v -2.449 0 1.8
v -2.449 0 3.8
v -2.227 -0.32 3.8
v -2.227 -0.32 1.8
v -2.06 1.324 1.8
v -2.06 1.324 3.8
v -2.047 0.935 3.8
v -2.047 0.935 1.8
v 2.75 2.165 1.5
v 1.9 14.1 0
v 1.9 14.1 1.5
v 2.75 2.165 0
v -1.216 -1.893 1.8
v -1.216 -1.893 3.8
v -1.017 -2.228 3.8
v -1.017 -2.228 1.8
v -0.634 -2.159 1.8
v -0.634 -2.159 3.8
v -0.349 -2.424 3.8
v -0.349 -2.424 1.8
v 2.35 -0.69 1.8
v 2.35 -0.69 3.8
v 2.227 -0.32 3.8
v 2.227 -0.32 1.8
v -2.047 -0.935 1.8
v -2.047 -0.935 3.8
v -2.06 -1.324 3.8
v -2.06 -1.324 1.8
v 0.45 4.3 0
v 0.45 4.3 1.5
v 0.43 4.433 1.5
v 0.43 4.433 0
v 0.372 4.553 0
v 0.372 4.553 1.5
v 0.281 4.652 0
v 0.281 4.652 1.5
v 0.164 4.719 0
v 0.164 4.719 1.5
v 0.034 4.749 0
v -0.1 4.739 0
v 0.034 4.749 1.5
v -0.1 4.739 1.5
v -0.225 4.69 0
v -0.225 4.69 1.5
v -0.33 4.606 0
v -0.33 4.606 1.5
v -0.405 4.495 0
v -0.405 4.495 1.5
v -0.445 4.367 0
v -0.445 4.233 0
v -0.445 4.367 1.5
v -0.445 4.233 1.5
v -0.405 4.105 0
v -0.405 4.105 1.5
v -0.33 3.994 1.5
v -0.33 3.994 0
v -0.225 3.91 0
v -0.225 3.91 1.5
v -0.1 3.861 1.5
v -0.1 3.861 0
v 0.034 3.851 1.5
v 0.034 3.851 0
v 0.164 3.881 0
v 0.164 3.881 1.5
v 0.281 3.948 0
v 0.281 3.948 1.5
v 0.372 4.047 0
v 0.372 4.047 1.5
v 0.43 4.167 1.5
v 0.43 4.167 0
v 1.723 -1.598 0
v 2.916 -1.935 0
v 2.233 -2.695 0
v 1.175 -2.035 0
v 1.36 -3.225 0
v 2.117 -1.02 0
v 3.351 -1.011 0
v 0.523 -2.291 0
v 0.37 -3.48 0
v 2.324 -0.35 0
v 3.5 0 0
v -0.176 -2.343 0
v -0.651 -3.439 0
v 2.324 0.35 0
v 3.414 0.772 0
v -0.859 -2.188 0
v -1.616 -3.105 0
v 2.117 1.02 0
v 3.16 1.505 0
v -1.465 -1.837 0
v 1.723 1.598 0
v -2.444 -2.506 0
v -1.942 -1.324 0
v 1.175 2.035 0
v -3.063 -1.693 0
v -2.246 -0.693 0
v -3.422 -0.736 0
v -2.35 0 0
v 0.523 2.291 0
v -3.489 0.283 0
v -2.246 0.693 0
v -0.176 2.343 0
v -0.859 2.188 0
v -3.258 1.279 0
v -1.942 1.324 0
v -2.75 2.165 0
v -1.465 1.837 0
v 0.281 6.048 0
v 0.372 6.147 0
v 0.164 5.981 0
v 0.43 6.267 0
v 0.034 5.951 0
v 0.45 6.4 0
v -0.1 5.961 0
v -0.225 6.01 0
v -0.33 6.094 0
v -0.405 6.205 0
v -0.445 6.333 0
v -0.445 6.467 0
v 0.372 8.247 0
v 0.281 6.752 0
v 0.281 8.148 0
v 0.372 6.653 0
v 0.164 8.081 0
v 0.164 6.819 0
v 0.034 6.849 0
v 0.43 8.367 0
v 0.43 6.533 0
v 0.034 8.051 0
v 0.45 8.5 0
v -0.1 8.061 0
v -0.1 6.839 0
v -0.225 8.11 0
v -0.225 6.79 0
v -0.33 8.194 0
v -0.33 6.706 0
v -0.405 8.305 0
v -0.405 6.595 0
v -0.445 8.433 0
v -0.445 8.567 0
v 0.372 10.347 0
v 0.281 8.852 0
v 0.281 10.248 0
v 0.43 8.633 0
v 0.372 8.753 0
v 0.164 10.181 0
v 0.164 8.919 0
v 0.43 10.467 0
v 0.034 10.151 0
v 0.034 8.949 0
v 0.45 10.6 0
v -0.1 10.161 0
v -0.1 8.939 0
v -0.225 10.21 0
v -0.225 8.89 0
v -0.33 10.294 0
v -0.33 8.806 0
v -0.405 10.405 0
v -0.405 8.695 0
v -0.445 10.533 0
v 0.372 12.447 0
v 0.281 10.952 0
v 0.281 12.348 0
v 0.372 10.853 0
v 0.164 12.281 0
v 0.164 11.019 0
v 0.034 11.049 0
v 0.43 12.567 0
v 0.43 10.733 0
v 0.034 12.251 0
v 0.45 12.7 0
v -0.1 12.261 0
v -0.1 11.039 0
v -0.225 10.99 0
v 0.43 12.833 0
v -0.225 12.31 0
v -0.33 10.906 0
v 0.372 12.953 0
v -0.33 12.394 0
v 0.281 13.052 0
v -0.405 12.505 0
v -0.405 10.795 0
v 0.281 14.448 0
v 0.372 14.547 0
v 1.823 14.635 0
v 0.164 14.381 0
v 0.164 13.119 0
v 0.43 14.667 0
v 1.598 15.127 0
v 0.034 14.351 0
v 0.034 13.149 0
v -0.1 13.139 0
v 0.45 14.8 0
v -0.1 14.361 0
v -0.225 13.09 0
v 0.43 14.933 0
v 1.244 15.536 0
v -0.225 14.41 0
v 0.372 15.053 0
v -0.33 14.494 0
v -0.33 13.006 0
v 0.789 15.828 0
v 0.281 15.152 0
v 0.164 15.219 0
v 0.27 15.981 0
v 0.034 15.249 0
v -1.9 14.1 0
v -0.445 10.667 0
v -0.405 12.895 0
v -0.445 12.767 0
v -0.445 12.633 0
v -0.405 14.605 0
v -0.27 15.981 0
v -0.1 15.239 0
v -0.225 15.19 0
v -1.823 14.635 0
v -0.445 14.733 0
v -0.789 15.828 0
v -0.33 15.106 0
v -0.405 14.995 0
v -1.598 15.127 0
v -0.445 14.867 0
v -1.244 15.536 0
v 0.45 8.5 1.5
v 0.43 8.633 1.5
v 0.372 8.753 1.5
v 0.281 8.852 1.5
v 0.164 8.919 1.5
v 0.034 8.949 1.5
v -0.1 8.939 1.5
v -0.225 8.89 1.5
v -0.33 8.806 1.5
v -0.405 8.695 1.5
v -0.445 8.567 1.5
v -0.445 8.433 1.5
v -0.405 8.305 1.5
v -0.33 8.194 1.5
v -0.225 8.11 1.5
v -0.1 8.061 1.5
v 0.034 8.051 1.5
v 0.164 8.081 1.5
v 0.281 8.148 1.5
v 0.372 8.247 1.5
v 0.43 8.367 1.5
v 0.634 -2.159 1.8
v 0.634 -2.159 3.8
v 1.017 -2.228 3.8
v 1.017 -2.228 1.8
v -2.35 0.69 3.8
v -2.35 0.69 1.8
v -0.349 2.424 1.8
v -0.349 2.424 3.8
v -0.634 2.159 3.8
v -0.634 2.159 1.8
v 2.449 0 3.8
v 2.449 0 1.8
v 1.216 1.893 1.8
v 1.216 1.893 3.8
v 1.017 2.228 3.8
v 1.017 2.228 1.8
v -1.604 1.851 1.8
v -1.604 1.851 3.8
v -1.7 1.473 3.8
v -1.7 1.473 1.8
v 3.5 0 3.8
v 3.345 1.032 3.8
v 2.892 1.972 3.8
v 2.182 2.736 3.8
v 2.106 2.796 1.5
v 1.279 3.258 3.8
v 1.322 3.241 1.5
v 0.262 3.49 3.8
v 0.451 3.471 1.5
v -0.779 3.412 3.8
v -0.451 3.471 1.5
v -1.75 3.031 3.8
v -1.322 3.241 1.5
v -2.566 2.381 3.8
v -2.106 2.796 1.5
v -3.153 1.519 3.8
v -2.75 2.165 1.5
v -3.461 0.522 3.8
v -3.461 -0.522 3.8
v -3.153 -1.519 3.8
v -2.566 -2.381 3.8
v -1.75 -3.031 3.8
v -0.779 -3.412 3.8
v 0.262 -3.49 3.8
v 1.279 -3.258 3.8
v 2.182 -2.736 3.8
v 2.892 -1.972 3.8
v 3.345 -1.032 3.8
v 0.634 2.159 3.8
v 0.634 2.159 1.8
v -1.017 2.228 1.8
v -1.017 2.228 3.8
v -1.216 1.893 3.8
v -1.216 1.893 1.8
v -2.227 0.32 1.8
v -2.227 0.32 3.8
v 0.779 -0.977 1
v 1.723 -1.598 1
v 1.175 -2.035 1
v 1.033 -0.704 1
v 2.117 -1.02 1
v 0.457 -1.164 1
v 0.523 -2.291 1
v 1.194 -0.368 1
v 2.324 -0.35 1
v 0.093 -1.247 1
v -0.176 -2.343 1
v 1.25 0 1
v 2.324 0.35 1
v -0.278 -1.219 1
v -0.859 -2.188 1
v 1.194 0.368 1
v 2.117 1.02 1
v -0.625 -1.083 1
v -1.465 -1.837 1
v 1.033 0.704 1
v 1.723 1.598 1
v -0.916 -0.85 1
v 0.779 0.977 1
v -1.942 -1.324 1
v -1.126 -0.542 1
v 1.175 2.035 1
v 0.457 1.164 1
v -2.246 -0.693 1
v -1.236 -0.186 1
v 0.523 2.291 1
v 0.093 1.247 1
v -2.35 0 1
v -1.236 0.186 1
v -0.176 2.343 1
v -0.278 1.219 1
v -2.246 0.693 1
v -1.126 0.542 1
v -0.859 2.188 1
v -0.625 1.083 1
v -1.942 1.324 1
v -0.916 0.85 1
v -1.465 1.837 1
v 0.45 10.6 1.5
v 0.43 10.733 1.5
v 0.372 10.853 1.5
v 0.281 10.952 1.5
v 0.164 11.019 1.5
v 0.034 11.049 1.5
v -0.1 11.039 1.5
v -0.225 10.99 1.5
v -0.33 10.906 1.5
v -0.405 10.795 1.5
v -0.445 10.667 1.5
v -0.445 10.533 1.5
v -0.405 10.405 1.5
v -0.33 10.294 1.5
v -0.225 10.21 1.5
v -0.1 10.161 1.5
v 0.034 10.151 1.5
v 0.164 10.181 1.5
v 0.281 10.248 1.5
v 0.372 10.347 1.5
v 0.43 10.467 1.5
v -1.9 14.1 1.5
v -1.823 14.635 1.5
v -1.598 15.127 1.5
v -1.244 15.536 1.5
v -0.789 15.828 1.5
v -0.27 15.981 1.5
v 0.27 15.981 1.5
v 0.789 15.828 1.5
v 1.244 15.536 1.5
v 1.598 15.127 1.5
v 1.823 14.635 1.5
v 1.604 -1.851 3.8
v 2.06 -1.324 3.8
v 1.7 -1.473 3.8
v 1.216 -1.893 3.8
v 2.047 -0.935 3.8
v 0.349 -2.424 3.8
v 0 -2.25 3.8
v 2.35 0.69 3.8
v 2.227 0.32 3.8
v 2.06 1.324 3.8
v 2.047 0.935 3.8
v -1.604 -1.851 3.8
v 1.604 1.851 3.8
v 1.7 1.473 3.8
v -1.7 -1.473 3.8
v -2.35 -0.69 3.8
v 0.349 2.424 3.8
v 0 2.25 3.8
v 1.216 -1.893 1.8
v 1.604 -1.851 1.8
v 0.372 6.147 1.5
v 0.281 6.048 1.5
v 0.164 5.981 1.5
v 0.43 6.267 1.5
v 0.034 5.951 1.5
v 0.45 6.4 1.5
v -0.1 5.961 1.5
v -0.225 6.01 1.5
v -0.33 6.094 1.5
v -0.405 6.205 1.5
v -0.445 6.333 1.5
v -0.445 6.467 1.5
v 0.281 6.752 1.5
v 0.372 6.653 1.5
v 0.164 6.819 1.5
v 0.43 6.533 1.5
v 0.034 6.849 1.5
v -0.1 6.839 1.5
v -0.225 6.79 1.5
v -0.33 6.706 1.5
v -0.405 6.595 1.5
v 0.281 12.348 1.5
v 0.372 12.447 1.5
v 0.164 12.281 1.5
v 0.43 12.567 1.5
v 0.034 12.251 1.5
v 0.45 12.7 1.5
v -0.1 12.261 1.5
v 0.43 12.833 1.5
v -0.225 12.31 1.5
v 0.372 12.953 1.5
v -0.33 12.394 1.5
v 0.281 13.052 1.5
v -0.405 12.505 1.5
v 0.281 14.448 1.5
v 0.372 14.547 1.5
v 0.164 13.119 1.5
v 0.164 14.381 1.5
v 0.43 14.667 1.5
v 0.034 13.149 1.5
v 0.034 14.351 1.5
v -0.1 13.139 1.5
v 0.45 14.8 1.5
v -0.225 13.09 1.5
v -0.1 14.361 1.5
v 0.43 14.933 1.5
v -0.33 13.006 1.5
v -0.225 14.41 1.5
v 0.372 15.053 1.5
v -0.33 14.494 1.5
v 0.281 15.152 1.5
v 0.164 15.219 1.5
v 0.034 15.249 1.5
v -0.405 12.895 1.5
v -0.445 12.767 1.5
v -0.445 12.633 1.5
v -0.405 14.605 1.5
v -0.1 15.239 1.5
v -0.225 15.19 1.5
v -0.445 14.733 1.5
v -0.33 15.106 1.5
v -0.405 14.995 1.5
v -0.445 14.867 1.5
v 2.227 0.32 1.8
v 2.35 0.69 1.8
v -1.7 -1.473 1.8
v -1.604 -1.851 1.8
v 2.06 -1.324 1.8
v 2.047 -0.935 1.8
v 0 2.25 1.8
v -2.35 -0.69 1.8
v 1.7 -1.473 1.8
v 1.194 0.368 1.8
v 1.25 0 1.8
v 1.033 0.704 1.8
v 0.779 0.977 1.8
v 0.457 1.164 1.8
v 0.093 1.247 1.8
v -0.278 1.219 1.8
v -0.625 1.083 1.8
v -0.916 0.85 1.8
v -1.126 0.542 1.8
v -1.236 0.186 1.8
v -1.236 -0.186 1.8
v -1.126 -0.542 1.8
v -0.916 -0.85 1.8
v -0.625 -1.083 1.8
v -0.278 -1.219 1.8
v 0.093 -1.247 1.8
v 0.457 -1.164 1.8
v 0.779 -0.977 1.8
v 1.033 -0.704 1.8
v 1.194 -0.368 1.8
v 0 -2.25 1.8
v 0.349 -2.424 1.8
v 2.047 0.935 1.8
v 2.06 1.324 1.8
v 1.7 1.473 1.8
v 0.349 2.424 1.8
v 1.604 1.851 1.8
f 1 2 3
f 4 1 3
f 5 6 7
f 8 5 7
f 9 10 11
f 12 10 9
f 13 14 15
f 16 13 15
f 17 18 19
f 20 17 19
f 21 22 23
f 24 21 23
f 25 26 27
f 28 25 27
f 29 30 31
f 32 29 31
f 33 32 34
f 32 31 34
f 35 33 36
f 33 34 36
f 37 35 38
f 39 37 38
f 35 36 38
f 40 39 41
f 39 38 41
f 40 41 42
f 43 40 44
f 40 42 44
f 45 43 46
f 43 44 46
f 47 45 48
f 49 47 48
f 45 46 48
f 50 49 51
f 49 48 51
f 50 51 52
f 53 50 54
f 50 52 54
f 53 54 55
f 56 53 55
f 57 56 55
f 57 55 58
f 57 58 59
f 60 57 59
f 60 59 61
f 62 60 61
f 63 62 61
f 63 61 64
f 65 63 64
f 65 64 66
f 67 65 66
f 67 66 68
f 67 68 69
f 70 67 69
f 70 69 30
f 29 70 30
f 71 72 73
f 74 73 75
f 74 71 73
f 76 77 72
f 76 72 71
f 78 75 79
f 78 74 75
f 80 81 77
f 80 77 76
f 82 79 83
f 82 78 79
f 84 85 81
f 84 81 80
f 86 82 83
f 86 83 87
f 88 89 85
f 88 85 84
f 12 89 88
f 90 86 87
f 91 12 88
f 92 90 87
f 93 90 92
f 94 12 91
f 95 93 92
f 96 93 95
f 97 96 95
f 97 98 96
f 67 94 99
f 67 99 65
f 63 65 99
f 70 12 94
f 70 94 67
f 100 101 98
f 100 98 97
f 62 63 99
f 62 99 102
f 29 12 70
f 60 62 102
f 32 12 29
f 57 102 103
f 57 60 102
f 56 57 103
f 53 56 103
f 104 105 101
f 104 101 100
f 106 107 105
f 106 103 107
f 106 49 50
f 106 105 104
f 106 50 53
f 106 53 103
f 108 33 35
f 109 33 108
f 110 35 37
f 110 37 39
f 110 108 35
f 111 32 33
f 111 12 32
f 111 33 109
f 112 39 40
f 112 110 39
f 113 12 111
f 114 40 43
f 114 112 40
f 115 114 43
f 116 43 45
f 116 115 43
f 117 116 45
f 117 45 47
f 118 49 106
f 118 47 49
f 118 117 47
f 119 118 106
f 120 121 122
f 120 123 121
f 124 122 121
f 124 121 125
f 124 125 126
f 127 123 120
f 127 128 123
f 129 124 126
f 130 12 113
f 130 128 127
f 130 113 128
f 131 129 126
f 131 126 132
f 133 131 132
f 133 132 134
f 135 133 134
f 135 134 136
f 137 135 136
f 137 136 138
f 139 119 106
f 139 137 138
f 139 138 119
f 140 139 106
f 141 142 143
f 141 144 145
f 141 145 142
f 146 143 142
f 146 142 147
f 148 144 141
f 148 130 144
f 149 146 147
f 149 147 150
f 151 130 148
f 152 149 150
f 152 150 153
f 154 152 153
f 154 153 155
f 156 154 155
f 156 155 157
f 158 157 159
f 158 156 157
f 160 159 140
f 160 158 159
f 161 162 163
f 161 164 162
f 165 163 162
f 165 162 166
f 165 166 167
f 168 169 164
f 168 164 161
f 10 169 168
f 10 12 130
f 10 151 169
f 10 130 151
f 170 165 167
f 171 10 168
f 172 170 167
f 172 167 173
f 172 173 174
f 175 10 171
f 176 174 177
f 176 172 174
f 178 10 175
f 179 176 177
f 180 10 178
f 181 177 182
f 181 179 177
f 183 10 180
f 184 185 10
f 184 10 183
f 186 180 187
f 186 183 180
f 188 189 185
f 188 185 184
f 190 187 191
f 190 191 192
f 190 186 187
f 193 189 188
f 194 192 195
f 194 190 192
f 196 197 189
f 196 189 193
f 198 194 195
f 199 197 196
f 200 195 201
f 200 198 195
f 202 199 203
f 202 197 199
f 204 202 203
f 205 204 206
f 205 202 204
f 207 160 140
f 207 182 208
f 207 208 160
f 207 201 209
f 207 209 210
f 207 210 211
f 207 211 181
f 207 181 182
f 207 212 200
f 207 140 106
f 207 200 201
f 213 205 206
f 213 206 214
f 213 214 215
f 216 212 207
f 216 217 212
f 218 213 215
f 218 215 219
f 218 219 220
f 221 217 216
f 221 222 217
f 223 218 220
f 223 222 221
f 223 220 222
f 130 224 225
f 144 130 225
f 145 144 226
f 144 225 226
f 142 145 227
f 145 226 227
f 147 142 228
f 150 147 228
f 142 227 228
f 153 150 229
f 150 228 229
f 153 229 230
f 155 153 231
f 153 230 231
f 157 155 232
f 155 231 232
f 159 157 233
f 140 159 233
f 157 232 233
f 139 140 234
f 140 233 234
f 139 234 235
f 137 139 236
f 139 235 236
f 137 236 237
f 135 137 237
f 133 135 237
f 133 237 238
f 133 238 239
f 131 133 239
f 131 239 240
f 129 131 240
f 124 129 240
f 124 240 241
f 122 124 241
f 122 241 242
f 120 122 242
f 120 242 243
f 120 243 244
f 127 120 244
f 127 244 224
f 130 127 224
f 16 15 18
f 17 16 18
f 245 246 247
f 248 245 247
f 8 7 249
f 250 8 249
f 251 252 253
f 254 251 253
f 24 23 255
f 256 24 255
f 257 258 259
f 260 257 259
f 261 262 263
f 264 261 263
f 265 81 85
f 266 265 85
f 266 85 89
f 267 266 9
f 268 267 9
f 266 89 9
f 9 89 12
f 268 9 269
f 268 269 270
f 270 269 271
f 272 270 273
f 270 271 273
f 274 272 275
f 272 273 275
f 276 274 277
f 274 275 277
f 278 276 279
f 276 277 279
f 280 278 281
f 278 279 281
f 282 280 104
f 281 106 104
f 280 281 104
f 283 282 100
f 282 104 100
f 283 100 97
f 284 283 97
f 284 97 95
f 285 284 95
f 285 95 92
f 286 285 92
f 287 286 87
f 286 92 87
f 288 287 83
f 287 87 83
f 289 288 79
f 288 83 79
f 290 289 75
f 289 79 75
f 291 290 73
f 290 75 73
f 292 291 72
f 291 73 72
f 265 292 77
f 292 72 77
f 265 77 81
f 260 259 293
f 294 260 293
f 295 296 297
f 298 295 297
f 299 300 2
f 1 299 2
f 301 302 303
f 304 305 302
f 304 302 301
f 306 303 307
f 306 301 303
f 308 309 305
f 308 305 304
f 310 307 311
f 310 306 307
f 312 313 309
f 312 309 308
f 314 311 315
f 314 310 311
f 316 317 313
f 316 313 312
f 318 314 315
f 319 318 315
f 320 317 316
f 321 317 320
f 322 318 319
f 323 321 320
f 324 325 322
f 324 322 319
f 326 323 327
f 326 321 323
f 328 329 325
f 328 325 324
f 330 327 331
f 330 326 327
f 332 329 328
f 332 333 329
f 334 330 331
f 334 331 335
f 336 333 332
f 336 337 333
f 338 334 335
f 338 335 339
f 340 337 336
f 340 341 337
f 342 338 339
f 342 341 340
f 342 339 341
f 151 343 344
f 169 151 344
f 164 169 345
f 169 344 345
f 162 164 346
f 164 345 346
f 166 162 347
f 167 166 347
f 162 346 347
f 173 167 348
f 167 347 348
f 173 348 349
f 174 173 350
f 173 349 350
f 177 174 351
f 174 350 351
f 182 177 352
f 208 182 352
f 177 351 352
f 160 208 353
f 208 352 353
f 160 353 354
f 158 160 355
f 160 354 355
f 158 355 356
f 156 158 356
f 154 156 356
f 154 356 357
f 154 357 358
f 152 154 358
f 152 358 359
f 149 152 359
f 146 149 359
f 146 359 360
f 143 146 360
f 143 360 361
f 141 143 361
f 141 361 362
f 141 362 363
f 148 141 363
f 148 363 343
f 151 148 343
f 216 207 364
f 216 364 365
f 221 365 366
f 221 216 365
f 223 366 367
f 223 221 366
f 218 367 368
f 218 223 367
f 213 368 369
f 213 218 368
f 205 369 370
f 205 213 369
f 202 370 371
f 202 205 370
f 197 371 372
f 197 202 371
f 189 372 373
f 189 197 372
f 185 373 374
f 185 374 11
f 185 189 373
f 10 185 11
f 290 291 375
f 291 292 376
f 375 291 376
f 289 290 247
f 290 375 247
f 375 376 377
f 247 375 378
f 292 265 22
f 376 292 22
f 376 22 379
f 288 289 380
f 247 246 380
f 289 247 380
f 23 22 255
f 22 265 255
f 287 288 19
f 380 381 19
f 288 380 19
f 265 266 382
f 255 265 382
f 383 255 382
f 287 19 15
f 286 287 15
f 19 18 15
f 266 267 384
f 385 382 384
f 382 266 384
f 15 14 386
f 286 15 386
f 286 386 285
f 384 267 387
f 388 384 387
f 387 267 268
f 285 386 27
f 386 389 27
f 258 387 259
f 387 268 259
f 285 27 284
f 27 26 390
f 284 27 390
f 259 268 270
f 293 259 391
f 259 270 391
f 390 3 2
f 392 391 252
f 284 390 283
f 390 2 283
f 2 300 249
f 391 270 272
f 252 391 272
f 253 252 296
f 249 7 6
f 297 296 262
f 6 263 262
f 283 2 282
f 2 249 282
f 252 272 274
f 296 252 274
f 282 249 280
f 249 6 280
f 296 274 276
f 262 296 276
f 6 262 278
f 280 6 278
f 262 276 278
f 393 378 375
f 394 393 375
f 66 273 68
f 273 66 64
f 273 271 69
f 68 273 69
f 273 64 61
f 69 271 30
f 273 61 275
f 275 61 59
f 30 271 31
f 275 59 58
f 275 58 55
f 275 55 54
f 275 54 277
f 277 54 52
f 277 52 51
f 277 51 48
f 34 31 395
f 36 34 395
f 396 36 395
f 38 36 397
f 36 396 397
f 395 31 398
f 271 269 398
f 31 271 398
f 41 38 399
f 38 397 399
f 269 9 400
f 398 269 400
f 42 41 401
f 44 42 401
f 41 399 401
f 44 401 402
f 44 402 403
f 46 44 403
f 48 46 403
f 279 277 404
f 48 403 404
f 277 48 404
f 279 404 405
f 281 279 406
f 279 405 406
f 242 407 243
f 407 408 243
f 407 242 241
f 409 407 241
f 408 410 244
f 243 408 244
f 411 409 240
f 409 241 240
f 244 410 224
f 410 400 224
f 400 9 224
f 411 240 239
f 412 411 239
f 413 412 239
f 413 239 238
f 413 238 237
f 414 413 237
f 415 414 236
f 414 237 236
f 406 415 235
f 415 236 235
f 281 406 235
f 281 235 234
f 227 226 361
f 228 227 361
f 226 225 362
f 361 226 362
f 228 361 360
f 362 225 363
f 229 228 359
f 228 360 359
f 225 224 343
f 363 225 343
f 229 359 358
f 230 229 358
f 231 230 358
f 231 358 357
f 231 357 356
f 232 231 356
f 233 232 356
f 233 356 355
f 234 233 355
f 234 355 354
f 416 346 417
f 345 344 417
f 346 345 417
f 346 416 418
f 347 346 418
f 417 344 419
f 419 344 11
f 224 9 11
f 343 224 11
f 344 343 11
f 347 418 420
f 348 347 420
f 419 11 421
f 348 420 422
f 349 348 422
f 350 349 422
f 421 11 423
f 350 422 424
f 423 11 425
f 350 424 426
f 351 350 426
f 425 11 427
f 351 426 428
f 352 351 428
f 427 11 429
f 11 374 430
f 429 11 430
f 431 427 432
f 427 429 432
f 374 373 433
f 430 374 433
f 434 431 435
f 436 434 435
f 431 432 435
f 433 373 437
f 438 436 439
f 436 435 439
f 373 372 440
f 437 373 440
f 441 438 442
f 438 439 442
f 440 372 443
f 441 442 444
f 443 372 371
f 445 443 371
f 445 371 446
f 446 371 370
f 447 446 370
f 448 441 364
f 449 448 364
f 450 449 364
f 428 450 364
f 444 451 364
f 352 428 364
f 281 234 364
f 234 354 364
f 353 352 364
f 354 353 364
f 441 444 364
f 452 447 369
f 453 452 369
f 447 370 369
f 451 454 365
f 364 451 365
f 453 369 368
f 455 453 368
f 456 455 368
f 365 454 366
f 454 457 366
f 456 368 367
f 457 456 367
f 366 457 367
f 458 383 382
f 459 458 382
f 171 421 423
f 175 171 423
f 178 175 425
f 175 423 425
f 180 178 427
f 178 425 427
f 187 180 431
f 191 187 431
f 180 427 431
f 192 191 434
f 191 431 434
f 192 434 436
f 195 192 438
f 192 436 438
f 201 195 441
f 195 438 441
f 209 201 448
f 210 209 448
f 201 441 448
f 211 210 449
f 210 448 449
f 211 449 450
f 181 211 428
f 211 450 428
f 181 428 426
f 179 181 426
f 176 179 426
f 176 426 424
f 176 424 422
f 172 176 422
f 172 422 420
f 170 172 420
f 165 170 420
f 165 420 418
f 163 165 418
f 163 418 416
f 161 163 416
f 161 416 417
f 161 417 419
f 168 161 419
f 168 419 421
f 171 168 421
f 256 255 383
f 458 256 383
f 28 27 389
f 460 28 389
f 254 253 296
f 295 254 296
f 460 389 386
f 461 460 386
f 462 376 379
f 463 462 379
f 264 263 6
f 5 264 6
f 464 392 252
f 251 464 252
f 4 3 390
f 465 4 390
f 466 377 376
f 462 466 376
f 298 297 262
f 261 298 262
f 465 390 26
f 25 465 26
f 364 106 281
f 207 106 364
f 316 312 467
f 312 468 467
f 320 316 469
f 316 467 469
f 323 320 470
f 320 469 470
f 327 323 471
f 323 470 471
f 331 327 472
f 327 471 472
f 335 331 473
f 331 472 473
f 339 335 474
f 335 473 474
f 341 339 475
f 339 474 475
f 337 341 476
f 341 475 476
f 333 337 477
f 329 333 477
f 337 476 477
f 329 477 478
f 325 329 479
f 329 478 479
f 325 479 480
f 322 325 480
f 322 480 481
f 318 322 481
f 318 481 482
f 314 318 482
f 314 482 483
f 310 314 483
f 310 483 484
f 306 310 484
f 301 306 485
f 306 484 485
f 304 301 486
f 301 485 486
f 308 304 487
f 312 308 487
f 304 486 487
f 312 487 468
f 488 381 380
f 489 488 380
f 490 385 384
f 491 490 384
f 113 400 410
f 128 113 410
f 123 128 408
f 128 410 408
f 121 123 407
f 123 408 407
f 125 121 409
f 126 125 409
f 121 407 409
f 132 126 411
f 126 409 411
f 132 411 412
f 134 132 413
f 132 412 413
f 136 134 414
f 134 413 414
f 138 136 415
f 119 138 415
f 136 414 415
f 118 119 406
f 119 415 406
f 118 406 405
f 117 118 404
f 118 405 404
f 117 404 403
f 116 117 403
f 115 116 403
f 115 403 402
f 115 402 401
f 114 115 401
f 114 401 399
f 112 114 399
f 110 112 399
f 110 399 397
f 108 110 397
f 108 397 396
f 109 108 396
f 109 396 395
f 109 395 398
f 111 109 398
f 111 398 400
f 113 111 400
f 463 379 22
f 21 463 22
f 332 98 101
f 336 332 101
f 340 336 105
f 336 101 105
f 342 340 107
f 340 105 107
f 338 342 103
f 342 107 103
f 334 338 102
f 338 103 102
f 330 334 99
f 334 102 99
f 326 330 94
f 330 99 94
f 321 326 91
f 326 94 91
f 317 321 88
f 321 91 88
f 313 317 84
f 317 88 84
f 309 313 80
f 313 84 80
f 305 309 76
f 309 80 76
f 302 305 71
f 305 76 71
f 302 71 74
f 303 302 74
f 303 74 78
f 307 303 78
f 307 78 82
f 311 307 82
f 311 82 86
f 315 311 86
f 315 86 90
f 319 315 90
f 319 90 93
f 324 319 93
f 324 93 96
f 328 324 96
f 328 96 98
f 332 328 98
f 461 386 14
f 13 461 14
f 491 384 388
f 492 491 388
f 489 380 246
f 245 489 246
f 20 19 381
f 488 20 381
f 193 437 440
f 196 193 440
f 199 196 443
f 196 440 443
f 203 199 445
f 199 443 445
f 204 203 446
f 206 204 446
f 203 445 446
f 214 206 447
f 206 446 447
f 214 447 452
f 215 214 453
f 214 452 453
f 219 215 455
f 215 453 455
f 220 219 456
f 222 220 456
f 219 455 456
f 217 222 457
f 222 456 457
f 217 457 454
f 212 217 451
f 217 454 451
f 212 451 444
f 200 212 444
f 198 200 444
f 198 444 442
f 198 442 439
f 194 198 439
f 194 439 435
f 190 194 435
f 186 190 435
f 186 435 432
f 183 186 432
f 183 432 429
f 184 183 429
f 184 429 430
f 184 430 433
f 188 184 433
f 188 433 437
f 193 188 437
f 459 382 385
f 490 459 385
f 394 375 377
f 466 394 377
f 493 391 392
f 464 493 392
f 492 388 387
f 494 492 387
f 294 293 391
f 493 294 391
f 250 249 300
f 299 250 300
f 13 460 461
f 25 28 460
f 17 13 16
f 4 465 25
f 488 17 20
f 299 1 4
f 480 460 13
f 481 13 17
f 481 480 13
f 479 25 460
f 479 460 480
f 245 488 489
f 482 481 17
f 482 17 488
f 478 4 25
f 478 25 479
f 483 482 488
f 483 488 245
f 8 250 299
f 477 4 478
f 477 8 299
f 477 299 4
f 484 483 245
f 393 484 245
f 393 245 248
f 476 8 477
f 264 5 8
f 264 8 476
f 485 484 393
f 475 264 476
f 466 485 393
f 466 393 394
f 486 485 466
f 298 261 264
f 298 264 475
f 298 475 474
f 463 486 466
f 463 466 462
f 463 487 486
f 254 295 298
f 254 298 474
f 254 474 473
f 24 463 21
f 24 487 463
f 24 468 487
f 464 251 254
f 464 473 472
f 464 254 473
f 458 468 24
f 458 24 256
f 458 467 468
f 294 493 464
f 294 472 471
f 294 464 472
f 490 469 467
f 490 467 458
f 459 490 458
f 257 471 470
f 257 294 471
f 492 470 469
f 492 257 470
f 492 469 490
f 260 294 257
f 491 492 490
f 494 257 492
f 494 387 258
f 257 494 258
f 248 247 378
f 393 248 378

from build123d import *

# Parameters (mm, degrees)
SKETCH1_W                                        = 3.5
SKETCH1_H                                        = 3.8
BOSS_EXTRUDE1_DEPTH                              = 1.5
CUT_EXTRUDE1_DEPTH                               = 2
F_0_9_0_9_DIAMETER_HOLE1_D                       = 0.9
F_0_9_0_9_DIAMETER_HOLE1_DEPTH                   = 3.8
CBORE_FOR_M2_HEX_HEAD_MACHINE_SCREW1_D           = 2.5
CBORE_FOR_M2_HEX_HEAD_MACHINE_SCREW1_DEPTH       = 3.8
CBORE_FOR_M2_HEX_HEAD_MACHINE_SCREW1_CBORE_D     = 4.7
CBORE_FOR_M2_HEX_HEAD_MACHINE_SCREW1_CBORE_DEPTH = 1


with BuildPart() as part:
    # Sketch1 → Revolve1 (revolve)
    with BuildSketch(Plane(origin=(0, 0, 0), x_dir=(1, 0, 0), z_dir=(0, 1, 0))):
        with Locations((1.75, -1.9)):
            Rectangle(SKETCH1_W, SKETCH1_H)
    revolve(axis=Axis((0, 0, 0), (0, 0, 1)))

    # Sketch2 → Boss-Extrude1 (add)
    with BuildSketch(Plane(origin=(0, 0, 0), x_dir=(-1, 0, 0), z_dir=(0, 0, -1))):
        with BuildLine():
            Line((-1.9, 14.1), (-2.75, 2.165063509))
            ThreePointArc((-2.75, 2.165063509), (0, 3.5), (2.75, 2.165063509))
            Line((2.75, 2.165063509), (1.9, 14.1))
            ThreePointArc((1.9, 14.1), (0, 16), (-1.9, 14.1))
        make_face()
    extrude(amount=-BOSS_EXTRUDE1_DEPTH)

    # Sketch3 → Cut-Extrude1 (cut)
    with BuildSketch(Plane.XY.offset(3.8)):
        Polygon((2.06028803, 1.324066719), (1.700436542, 1.473436651), (1.603799186, 1.850882928), (1.216441839, 1.892820449), (1.017380071, 2.227751609), (0.633898253, 2.158859191), (0.348538872, 2.424141105), (0, 2.25), (-0.348538872, 2.424141105), (-0.633898253, 2.158859191), (-1.017380071, 2.227751609), (-1.216441839, 1.892820449), (-1.603799186, 1.850882928), (-1.700436542, 1.473436651), (-2.06028803, 1.324066719), (-2.04667199, 0.934683779), (-2.34986459, 0.689982499), (-2.227098244, 0.320208386), (-2.449069097, 0), (-2.227098244, -0.320208386), (-2.34986459, -0.689982499), (-2.04667199, -0.934683779), (-2.06028803, -1.324066719), (-1.700436542, -1.473436651), (-1.603799186, -1.850882928), (-1.216441839, -1.892820449), (-1.017380071, -2.227751609), (-0.633898253, -2.158859191), (-0.348538872, -2.424141105), (0, -2.25), (0.348538872, -2.424141105), (0.633898253, -2.158859191), (1.017380071, -2.227751609), (1.216441839, -1.892820449), (1.603799186, -1.850882928), (1.700436542, -1.473436651), (2.06028803, -1.324066719), (2.04667199, -0.934683779), (2.34986459, -0.689982499), (2.227098244, -0.320208386), (2.449069097, 0), (2.227098244, 0.320208386), (2.34986459, 0.689982499), (2.04667199, 0.934683779), align=None)
    extrude(amount=-CUT_EXTRUDE1_DEPTH, mode=Mode.SUBTRACT)

    # Ø0.9 (0.9) Diameter Hole1
    with Locations(Plane(origin=(0, 0, 0), x_dir=(-1, 0, 0), z_dir=(0, 0, -1))):
        with Locations((0, 10.6), (0, 12.7), (0, 14.8), (0, 6.4), (0, 8.5), (0, 4.3)):
            Hole(F_0_9_0_9_DIAMETER_HOLE1_D / 2, depth=F_0_9_0_9_DIAMETER_HOLE1_DEPTH)

    # CBORE for M2 Hex Head Machine Screw1
    with Locations(Plane(origin=(0, 0, 0), x_dir=(-1, 0, 0), z_dir=(0, 0, -1))):
        with Locations((0, 0)):
            CounterBoreHole(CBORE_FOR_M2_HEX_HEAD_MACHINE_SCREW1_D / 2, CBORE_FOR_M2_HEX_HEAD_MACHINE_SCREW1_CBORE_D / 2, CBORE_FOR_M2_HEX_HEAD_MACHINE_SCREW1_CBORE_DEPTH, depth=CBORE_FOR_M2_HEX_HEAD_MACHINE_SCREW1_DEPTH)


solid = part.part
